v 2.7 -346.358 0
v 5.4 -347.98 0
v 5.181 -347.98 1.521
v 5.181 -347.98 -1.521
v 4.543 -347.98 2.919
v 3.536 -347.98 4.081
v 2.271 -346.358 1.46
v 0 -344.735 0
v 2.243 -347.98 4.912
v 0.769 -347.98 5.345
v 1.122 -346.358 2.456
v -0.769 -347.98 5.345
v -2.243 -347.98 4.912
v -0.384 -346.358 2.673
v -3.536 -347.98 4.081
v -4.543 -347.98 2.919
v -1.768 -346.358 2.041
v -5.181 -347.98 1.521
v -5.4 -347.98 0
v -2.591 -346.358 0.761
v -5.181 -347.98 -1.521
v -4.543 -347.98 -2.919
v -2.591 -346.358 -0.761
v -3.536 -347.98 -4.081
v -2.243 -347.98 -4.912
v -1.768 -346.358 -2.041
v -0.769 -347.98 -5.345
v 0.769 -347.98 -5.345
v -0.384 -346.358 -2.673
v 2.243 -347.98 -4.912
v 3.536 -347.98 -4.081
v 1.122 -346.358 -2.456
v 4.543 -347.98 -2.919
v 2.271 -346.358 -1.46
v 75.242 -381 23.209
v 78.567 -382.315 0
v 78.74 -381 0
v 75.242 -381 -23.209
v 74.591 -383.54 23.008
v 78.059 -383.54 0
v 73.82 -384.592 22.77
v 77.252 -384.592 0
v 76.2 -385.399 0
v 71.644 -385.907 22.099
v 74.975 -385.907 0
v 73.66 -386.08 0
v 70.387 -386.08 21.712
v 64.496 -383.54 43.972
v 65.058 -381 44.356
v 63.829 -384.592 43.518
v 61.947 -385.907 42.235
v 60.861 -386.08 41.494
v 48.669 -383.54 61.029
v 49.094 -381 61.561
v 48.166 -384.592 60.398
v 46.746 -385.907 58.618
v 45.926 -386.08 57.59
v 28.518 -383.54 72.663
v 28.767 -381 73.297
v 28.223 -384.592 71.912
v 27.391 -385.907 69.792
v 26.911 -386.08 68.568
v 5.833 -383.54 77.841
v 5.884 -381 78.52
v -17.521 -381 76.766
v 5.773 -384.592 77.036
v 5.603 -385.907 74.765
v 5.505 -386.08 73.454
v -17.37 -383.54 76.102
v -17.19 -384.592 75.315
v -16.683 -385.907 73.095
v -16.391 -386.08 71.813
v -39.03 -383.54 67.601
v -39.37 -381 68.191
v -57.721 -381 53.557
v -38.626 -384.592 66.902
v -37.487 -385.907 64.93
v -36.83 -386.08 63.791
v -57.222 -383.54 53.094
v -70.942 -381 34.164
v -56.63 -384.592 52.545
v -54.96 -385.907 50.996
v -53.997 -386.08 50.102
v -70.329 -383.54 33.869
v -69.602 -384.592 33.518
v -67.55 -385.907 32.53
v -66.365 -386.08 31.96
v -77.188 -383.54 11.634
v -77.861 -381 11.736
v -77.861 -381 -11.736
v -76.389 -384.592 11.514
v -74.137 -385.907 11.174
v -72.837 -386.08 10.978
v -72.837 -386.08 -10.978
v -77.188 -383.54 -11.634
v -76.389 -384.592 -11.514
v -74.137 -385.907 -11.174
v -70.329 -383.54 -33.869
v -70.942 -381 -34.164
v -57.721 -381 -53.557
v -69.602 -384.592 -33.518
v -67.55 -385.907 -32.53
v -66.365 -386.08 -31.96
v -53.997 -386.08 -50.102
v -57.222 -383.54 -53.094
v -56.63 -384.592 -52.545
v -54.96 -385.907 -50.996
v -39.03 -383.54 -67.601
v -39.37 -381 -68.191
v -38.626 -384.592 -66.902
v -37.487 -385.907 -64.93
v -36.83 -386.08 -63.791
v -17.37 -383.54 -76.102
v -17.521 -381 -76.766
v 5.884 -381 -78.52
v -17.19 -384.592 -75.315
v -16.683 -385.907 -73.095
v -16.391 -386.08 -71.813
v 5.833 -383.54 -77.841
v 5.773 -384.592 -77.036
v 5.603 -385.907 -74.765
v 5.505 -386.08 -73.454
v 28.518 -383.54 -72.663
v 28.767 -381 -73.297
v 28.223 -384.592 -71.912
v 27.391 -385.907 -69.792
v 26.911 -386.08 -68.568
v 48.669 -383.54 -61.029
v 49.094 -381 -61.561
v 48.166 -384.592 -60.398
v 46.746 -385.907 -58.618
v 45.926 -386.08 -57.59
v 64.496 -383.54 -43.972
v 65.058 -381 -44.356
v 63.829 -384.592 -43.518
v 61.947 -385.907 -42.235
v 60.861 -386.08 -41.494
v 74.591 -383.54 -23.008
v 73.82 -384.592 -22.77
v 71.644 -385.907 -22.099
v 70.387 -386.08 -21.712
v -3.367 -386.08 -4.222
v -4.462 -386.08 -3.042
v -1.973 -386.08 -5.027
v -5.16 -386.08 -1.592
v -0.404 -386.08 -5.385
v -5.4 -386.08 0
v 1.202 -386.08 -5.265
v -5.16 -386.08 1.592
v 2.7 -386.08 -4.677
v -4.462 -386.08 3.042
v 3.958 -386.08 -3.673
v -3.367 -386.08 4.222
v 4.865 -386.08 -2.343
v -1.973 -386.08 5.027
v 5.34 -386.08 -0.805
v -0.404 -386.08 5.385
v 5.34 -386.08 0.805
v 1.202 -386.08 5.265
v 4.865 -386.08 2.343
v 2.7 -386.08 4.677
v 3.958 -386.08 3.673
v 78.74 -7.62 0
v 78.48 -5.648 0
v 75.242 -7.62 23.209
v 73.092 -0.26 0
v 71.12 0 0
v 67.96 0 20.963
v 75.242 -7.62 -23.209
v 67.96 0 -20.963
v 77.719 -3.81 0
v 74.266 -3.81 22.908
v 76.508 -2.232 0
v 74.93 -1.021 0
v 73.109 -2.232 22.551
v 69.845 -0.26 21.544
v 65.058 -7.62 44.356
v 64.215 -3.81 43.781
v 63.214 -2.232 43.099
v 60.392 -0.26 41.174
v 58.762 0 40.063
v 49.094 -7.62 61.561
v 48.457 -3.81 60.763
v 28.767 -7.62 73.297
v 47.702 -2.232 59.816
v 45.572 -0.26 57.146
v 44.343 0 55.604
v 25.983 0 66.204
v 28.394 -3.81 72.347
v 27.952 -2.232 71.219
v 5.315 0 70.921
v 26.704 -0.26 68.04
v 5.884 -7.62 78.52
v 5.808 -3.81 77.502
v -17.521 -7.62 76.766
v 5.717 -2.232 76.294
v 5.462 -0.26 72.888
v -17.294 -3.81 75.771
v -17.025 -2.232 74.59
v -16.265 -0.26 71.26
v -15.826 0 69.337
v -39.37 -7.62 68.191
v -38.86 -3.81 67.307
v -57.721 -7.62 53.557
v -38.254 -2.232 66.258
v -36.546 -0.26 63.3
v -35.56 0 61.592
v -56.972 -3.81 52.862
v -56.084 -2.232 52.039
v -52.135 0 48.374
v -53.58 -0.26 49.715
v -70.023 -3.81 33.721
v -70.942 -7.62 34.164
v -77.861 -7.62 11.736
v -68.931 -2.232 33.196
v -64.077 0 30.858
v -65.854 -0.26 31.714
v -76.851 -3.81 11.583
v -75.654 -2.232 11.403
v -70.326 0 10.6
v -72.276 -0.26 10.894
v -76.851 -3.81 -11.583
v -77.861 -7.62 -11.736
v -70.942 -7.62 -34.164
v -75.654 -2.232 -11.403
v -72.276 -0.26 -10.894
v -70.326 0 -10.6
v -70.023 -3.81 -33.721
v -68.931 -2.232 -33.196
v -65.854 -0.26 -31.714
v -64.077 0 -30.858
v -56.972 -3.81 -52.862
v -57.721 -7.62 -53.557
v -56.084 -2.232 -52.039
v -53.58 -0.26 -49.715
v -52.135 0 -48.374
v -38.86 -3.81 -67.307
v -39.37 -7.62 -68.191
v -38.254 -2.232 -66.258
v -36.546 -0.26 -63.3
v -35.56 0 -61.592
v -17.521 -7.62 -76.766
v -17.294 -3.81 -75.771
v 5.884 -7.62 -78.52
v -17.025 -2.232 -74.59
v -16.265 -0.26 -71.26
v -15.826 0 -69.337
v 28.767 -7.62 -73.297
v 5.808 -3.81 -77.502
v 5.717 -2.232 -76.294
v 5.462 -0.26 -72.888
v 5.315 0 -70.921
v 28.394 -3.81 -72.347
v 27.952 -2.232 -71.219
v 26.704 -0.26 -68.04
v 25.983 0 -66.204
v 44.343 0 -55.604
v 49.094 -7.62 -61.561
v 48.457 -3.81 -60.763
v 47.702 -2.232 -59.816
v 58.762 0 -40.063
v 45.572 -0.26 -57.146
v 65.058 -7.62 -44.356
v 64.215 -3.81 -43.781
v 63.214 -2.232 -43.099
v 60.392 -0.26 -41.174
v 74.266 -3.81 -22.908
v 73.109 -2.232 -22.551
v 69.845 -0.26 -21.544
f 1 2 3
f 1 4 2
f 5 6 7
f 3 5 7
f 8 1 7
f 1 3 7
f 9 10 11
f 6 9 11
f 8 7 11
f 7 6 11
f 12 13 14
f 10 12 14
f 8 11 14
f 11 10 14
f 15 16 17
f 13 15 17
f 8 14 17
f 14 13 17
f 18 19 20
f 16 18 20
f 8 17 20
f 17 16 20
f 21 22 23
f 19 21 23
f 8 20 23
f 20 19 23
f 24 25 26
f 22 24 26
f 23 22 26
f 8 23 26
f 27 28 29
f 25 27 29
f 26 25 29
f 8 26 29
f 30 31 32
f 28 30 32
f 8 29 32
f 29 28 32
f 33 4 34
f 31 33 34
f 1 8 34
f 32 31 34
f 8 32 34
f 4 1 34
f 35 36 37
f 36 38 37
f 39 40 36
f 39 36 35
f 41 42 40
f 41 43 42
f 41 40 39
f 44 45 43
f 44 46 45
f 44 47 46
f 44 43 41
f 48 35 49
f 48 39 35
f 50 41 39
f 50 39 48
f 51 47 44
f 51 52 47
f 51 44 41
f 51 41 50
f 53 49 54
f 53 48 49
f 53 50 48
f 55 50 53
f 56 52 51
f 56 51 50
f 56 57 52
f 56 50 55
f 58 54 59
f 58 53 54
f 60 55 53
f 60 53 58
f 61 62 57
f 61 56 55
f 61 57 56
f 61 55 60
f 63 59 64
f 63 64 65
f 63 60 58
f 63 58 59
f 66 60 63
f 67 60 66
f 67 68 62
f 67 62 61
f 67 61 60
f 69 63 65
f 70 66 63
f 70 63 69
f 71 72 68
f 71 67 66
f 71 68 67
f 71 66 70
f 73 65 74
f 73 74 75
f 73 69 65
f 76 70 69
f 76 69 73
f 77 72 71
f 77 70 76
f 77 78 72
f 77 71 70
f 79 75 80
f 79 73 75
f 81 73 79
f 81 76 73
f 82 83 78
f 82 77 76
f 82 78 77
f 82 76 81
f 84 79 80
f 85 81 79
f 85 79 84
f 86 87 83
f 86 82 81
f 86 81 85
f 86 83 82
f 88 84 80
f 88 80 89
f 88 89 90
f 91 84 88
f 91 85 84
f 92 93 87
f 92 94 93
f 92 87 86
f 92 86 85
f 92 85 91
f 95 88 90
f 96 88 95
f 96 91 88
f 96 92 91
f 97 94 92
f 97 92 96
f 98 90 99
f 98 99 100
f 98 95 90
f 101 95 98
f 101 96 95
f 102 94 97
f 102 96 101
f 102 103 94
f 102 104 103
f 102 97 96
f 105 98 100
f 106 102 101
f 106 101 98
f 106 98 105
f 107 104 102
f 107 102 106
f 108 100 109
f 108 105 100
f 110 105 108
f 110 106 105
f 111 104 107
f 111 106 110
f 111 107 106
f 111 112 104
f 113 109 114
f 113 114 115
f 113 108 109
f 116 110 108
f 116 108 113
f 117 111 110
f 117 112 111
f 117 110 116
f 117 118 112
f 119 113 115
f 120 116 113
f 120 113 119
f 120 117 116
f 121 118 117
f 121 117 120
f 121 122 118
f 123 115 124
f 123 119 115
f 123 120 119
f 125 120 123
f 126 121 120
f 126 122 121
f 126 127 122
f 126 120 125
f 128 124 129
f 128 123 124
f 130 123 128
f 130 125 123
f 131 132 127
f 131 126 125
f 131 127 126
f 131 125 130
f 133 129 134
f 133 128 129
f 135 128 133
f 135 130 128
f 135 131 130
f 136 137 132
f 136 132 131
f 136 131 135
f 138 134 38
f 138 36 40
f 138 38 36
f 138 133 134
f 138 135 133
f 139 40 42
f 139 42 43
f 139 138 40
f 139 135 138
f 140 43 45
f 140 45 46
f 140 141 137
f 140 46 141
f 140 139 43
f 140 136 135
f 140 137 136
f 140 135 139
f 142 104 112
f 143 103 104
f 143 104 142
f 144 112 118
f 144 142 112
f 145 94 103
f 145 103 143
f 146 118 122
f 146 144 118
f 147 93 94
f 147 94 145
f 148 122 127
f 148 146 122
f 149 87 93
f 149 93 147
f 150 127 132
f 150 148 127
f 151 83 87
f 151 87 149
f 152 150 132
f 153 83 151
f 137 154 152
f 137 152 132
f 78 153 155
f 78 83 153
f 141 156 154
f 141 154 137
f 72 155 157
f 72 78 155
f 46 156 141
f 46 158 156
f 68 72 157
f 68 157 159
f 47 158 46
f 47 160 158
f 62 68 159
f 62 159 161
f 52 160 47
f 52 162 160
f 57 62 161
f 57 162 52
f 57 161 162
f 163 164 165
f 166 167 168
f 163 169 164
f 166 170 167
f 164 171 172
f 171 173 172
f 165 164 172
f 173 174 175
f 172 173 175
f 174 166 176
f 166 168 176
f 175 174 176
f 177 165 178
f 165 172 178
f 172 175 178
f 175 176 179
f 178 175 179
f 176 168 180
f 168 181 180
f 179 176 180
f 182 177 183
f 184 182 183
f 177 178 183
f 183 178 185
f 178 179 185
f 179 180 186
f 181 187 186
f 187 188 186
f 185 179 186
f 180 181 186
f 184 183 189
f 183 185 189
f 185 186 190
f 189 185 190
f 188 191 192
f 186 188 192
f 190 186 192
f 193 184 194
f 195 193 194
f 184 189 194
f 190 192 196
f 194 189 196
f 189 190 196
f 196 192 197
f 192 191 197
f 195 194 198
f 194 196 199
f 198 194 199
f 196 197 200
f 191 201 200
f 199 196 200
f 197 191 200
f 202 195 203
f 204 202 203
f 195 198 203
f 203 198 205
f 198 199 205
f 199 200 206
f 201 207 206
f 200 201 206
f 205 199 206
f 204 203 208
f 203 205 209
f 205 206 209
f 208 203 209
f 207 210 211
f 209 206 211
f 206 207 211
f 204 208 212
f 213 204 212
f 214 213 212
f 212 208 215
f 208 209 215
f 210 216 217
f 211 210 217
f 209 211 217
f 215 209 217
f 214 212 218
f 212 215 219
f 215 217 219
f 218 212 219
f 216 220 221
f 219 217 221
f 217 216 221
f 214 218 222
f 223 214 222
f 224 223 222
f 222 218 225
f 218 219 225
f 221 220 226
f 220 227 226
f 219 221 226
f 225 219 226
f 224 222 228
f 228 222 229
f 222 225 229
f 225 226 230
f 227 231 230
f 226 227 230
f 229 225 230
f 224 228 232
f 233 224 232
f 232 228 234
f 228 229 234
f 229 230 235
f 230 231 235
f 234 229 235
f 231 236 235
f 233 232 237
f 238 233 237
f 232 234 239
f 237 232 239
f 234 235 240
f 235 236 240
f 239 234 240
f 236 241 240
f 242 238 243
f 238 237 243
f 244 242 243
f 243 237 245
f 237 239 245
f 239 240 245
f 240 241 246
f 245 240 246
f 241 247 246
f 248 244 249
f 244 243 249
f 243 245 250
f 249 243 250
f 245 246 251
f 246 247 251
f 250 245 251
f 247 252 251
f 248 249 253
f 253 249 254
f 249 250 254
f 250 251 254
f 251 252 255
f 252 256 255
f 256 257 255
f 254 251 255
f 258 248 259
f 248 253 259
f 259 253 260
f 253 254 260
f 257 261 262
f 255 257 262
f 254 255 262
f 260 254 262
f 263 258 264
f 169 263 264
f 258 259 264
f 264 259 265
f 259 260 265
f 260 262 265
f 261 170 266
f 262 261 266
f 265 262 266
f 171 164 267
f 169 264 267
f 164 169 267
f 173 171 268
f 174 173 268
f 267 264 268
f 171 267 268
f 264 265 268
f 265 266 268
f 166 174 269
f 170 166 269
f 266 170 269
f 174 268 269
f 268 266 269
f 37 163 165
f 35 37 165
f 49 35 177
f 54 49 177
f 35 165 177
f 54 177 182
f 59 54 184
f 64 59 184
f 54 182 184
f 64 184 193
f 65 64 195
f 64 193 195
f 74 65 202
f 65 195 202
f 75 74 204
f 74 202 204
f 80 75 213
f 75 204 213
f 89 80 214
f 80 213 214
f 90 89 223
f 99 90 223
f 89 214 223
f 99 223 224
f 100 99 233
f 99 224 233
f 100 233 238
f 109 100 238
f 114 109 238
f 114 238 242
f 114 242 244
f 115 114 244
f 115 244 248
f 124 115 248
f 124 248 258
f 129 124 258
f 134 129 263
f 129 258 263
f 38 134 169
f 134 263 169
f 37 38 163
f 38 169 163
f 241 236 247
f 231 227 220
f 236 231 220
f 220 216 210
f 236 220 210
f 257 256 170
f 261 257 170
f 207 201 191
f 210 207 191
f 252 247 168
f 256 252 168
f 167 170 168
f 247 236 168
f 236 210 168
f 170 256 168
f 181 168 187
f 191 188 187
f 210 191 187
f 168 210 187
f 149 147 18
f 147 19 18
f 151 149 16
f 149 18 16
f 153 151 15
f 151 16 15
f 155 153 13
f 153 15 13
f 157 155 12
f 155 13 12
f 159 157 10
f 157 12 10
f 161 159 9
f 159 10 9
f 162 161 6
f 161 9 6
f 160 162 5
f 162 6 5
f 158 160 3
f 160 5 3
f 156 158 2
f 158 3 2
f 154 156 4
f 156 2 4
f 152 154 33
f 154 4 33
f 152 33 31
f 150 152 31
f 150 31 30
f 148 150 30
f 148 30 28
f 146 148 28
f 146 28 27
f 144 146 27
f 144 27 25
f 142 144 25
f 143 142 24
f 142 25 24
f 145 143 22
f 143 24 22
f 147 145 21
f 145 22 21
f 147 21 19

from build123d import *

# Parameters (mm, degrees)
F0_R     = 78.74
F1_DEPTH = 386.08
F3_D     = 10.8
F3_DEPTH = 38.1
F3_TIP   = 3.2446473427
F4_R     = 5.08
F5_R     = 7.62


with BuildPart() as f1:
    # F0 (on Front) → F1 (new body)
    with BuildSketch(Plane.XZ):
        Circle(F0_R)
    extrude(amount=F1_DEPTH)

    # F3
    with Locations(Plane.XZ.offset(386.08)):
        with Locations((0, 0)):
            Hole(F3_D / 2, depth=F3_DEPTH)
            with Locations((0, 0, -(F3_DEPTH + F3_TIP / 2))):  # 118° drill point
                Cone(0, F3_D / 2, F3_TIP, mode=Mode.SUBTRACT)

    # F4
    f4_edges = [f1.edges().sort_by_distance(p)[0] for p in [
        (-78.74, -386.08, 0),
    ]]
    fillet(f4_edges, radius=F4_R)

    # F5
    f5_edges = [f1.edges().sort_by_distance(p)[0] for p in [
        (-78.74, 0, 0),
    ]]
    fillet(f5_edges, radius=F5_R)


solid = f1.part
